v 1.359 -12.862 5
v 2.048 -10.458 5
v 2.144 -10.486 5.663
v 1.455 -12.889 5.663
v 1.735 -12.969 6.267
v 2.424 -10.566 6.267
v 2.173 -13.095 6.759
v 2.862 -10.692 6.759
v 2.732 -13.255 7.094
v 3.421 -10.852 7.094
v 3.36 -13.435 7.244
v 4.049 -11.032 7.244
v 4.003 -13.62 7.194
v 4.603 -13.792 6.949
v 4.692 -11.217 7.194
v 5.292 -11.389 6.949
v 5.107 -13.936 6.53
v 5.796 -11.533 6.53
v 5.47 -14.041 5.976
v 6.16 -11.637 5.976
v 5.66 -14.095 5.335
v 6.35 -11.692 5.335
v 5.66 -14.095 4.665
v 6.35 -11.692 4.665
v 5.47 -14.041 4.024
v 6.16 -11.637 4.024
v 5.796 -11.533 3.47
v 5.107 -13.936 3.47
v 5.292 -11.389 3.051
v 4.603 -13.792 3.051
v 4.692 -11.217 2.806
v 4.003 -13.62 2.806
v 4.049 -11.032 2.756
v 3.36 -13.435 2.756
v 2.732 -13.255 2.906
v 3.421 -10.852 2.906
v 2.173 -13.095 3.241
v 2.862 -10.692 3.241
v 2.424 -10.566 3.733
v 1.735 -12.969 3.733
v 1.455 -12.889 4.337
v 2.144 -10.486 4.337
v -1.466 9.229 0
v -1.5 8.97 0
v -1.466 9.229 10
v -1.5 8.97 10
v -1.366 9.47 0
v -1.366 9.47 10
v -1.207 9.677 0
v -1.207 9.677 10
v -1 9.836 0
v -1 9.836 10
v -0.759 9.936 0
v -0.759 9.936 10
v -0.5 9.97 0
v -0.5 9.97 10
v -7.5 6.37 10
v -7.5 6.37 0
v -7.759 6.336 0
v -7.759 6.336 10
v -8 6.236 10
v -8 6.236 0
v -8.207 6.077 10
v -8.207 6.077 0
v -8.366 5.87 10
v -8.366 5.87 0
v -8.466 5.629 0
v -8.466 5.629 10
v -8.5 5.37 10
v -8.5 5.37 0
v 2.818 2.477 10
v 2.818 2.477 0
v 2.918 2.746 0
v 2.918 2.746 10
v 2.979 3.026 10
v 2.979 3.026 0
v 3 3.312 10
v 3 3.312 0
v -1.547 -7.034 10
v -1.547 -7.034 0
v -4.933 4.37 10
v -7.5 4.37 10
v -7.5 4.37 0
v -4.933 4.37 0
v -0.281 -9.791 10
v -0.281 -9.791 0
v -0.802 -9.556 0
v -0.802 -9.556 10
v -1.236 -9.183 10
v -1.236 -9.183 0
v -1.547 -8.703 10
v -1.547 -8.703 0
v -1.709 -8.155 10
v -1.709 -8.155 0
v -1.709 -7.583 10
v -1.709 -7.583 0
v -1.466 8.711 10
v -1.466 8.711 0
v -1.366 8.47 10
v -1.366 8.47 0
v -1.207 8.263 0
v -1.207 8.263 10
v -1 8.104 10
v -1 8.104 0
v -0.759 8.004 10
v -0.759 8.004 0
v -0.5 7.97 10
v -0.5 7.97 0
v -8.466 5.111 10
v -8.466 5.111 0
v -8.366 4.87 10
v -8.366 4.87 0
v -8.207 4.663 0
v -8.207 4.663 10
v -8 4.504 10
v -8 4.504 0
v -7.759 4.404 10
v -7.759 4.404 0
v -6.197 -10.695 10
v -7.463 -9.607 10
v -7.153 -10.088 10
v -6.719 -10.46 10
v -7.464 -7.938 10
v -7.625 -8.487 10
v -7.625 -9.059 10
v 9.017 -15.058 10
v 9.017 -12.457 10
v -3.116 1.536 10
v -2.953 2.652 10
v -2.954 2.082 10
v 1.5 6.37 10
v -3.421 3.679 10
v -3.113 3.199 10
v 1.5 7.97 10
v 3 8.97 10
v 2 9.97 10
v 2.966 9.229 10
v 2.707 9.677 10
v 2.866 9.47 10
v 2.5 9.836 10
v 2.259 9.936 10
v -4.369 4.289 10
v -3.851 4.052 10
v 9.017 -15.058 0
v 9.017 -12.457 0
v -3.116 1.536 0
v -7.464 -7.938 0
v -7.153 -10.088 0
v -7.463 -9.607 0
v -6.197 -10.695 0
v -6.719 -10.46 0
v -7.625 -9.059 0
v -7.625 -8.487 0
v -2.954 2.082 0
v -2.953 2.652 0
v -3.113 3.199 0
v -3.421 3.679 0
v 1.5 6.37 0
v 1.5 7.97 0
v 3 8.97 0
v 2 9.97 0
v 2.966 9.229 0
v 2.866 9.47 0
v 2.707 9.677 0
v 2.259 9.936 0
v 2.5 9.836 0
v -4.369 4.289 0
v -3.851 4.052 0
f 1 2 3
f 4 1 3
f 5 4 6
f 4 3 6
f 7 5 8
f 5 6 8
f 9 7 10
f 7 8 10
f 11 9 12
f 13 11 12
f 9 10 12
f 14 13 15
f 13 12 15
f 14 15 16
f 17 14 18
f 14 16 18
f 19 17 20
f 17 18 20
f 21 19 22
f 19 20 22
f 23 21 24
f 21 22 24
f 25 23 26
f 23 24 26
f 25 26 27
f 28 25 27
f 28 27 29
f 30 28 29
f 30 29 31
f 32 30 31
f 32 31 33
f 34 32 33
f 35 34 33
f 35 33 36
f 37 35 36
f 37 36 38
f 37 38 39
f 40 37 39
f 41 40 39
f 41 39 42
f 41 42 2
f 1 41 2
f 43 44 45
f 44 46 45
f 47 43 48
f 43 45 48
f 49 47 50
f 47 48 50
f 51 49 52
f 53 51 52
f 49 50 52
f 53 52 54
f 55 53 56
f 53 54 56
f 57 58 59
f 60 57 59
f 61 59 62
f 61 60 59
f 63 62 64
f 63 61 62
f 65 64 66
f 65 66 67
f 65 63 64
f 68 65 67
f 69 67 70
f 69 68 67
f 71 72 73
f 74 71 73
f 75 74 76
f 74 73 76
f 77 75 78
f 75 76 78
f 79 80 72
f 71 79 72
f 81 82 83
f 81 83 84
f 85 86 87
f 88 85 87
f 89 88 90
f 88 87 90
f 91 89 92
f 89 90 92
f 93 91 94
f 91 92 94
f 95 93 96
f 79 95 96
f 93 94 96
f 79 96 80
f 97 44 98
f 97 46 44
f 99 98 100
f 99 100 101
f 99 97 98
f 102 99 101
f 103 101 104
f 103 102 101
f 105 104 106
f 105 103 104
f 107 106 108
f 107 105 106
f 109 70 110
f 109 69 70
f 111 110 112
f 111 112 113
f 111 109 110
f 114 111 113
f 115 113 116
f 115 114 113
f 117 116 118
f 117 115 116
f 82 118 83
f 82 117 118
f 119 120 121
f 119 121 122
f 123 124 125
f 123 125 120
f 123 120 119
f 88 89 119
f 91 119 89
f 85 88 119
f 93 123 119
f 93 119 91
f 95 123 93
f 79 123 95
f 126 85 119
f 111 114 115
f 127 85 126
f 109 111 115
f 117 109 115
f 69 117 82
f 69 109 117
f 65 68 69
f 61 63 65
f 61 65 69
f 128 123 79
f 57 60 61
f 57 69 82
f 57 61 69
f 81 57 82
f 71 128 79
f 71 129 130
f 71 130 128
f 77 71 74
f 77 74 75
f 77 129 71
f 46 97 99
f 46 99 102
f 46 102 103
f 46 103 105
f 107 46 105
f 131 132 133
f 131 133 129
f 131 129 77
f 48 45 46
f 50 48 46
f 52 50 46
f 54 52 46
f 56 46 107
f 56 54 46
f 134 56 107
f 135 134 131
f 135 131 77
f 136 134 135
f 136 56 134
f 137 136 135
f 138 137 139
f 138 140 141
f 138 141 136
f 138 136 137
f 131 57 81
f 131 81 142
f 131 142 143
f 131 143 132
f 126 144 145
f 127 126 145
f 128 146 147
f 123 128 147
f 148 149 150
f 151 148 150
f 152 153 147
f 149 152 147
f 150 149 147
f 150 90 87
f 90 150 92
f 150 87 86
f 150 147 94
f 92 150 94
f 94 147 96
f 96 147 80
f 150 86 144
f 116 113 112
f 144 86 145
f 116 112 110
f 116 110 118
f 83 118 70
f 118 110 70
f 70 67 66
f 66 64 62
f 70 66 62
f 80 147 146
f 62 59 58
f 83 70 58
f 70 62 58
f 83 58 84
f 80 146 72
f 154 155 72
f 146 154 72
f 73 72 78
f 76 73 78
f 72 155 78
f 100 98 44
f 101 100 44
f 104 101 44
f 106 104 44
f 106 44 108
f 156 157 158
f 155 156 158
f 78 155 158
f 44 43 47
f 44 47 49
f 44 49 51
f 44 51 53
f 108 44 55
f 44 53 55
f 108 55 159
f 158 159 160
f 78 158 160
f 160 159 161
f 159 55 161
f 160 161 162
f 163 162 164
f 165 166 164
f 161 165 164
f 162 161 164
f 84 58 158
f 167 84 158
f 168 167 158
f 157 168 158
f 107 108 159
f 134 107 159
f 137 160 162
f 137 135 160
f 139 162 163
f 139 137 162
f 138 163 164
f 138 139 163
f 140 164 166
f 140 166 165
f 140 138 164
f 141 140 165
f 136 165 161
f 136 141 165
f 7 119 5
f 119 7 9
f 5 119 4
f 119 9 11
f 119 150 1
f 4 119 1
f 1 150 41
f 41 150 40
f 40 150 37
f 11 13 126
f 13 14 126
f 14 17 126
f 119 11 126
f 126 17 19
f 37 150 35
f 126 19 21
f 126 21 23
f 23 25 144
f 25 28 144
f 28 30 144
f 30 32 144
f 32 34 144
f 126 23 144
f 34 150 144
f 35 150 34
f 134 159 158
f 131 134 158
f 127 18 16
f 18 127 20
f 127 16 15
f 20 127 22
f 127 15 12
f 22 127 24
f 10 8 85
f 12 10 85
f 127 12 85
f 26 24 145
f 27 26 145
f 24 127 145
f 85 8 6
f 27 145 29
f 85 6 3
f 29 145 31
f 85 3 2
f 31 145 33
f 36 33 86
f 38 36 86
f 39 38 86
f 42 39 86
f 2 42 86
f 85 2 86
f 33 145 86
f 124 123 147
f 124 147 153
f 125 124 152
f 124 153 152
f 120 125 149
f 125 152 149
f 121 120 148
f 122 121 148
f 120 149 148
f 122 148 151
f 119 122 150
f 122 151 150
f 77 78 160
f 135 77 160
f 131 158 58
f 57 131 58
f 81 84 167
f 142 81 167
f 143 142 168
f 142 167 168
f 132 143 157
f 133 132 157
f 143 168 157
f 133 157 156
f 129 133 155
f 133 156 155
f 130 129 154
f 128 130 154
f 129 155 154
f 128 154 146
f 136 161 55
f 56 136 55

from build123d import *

# Parameters (mm, degrees)
BOSS_EXTRUDE1_DEPTH = 10
FILLET1_R           = 1
SKETCH3_R           = 2.25
CUT_EXTRUDE1_DEPTH  = 5


with BuildPart() as part:
    # Sketch2 → Boss-Extrude1 (new body)
    with BuildSketch(Plane.XY):
        with BuildLine():
            Line((-1.5, 9.9700831), (-1.5, 7.9700831))
            Line((-1.5, 7.9700831), (1.5, 7.9700831))
            Line((1.5, 7.9700831), (1.5, 6.3700831))
            Line((1.5, 6.3700831), (-8.5, 6.3700831))
            Line((-8.5, 6.3700831), (-8.5, 4.3700831))
            Line((-8.5, 4.3700831), (-4.933456572, 4.3700831))
            ThreePointArc((-4.933456572, 4.3700831), (-3.249951556, 3.449810315), (-3.115730388, 1.535893959))
            Line((-3.115730388, 1.535893959), (-7.463599773, -7.938259613))
            ThreePointArc((-7.463599773, -7.938259613), (-7.463263835, -9.607369524), (-6.197148301, -10.694972145))
            Line((-6.197148301, -10.694972145), (9.017188246, -15.057612947))
            Line((9.017188246, -15.057612947), (9.017188246, -12.456864357))
            Line((9.017188246, -12.456864357), (-0.280787764, -9.79071264))
            ThreePointArc((-0.280787764, -9.79071264), (-1.546903298, -8.703110018), (-1.547239236, -7.034000107))
            Line((-1.547239236, -7.034000107), (2.817726184, 2.4774063))
            ThreePointArc((2.817726184, 2.4774063), (2.953900249, 2.884660063), (3, 3.31159544))
            Line((3, 3.31159544), (3, 9.9700831))
            Line((3, 9.9700831), (-1.5, 9.9700831))
        make_face()
    extrude(amount=BOSS_EXTRUDE1_DEPTH)

    # Fillet1
    fillet1_edges = [part.edges().sort_by_distance(p)[0] for p in [
        (-8.5, 6.3700831, 5),
        (-1.5, 7.9700831, 5),
        (-1.5, 9.9700831, 5),
        (3, 9.9700831, 5),
        (-8.5, 4.3700831, 5),
    ]]
    fillet(fillet1_edges, radius=FILLET1_R - 0.0001)  # a hair under: the kernel refuses the full size

    # Sketch3 → Cut-Extrude1 (cut)
    with BuildSketch(Plane(origin=(-2.615476737, -9.121251349, 0), x_dir=(0.9612616959383208, -0.27563735581699245, 0), z_dir=(0.27563735581699245, 0.9612616959383208, 0))):
        with Locations(Location((7.101454819, -5, 0), (0, 0, 180))):
            Circle(SKETCH3_R)
    extrude(amount=-CUT_EXTRUDE1_DEPTH, mode=Mode.SUBTRACT)


solid = part.part
